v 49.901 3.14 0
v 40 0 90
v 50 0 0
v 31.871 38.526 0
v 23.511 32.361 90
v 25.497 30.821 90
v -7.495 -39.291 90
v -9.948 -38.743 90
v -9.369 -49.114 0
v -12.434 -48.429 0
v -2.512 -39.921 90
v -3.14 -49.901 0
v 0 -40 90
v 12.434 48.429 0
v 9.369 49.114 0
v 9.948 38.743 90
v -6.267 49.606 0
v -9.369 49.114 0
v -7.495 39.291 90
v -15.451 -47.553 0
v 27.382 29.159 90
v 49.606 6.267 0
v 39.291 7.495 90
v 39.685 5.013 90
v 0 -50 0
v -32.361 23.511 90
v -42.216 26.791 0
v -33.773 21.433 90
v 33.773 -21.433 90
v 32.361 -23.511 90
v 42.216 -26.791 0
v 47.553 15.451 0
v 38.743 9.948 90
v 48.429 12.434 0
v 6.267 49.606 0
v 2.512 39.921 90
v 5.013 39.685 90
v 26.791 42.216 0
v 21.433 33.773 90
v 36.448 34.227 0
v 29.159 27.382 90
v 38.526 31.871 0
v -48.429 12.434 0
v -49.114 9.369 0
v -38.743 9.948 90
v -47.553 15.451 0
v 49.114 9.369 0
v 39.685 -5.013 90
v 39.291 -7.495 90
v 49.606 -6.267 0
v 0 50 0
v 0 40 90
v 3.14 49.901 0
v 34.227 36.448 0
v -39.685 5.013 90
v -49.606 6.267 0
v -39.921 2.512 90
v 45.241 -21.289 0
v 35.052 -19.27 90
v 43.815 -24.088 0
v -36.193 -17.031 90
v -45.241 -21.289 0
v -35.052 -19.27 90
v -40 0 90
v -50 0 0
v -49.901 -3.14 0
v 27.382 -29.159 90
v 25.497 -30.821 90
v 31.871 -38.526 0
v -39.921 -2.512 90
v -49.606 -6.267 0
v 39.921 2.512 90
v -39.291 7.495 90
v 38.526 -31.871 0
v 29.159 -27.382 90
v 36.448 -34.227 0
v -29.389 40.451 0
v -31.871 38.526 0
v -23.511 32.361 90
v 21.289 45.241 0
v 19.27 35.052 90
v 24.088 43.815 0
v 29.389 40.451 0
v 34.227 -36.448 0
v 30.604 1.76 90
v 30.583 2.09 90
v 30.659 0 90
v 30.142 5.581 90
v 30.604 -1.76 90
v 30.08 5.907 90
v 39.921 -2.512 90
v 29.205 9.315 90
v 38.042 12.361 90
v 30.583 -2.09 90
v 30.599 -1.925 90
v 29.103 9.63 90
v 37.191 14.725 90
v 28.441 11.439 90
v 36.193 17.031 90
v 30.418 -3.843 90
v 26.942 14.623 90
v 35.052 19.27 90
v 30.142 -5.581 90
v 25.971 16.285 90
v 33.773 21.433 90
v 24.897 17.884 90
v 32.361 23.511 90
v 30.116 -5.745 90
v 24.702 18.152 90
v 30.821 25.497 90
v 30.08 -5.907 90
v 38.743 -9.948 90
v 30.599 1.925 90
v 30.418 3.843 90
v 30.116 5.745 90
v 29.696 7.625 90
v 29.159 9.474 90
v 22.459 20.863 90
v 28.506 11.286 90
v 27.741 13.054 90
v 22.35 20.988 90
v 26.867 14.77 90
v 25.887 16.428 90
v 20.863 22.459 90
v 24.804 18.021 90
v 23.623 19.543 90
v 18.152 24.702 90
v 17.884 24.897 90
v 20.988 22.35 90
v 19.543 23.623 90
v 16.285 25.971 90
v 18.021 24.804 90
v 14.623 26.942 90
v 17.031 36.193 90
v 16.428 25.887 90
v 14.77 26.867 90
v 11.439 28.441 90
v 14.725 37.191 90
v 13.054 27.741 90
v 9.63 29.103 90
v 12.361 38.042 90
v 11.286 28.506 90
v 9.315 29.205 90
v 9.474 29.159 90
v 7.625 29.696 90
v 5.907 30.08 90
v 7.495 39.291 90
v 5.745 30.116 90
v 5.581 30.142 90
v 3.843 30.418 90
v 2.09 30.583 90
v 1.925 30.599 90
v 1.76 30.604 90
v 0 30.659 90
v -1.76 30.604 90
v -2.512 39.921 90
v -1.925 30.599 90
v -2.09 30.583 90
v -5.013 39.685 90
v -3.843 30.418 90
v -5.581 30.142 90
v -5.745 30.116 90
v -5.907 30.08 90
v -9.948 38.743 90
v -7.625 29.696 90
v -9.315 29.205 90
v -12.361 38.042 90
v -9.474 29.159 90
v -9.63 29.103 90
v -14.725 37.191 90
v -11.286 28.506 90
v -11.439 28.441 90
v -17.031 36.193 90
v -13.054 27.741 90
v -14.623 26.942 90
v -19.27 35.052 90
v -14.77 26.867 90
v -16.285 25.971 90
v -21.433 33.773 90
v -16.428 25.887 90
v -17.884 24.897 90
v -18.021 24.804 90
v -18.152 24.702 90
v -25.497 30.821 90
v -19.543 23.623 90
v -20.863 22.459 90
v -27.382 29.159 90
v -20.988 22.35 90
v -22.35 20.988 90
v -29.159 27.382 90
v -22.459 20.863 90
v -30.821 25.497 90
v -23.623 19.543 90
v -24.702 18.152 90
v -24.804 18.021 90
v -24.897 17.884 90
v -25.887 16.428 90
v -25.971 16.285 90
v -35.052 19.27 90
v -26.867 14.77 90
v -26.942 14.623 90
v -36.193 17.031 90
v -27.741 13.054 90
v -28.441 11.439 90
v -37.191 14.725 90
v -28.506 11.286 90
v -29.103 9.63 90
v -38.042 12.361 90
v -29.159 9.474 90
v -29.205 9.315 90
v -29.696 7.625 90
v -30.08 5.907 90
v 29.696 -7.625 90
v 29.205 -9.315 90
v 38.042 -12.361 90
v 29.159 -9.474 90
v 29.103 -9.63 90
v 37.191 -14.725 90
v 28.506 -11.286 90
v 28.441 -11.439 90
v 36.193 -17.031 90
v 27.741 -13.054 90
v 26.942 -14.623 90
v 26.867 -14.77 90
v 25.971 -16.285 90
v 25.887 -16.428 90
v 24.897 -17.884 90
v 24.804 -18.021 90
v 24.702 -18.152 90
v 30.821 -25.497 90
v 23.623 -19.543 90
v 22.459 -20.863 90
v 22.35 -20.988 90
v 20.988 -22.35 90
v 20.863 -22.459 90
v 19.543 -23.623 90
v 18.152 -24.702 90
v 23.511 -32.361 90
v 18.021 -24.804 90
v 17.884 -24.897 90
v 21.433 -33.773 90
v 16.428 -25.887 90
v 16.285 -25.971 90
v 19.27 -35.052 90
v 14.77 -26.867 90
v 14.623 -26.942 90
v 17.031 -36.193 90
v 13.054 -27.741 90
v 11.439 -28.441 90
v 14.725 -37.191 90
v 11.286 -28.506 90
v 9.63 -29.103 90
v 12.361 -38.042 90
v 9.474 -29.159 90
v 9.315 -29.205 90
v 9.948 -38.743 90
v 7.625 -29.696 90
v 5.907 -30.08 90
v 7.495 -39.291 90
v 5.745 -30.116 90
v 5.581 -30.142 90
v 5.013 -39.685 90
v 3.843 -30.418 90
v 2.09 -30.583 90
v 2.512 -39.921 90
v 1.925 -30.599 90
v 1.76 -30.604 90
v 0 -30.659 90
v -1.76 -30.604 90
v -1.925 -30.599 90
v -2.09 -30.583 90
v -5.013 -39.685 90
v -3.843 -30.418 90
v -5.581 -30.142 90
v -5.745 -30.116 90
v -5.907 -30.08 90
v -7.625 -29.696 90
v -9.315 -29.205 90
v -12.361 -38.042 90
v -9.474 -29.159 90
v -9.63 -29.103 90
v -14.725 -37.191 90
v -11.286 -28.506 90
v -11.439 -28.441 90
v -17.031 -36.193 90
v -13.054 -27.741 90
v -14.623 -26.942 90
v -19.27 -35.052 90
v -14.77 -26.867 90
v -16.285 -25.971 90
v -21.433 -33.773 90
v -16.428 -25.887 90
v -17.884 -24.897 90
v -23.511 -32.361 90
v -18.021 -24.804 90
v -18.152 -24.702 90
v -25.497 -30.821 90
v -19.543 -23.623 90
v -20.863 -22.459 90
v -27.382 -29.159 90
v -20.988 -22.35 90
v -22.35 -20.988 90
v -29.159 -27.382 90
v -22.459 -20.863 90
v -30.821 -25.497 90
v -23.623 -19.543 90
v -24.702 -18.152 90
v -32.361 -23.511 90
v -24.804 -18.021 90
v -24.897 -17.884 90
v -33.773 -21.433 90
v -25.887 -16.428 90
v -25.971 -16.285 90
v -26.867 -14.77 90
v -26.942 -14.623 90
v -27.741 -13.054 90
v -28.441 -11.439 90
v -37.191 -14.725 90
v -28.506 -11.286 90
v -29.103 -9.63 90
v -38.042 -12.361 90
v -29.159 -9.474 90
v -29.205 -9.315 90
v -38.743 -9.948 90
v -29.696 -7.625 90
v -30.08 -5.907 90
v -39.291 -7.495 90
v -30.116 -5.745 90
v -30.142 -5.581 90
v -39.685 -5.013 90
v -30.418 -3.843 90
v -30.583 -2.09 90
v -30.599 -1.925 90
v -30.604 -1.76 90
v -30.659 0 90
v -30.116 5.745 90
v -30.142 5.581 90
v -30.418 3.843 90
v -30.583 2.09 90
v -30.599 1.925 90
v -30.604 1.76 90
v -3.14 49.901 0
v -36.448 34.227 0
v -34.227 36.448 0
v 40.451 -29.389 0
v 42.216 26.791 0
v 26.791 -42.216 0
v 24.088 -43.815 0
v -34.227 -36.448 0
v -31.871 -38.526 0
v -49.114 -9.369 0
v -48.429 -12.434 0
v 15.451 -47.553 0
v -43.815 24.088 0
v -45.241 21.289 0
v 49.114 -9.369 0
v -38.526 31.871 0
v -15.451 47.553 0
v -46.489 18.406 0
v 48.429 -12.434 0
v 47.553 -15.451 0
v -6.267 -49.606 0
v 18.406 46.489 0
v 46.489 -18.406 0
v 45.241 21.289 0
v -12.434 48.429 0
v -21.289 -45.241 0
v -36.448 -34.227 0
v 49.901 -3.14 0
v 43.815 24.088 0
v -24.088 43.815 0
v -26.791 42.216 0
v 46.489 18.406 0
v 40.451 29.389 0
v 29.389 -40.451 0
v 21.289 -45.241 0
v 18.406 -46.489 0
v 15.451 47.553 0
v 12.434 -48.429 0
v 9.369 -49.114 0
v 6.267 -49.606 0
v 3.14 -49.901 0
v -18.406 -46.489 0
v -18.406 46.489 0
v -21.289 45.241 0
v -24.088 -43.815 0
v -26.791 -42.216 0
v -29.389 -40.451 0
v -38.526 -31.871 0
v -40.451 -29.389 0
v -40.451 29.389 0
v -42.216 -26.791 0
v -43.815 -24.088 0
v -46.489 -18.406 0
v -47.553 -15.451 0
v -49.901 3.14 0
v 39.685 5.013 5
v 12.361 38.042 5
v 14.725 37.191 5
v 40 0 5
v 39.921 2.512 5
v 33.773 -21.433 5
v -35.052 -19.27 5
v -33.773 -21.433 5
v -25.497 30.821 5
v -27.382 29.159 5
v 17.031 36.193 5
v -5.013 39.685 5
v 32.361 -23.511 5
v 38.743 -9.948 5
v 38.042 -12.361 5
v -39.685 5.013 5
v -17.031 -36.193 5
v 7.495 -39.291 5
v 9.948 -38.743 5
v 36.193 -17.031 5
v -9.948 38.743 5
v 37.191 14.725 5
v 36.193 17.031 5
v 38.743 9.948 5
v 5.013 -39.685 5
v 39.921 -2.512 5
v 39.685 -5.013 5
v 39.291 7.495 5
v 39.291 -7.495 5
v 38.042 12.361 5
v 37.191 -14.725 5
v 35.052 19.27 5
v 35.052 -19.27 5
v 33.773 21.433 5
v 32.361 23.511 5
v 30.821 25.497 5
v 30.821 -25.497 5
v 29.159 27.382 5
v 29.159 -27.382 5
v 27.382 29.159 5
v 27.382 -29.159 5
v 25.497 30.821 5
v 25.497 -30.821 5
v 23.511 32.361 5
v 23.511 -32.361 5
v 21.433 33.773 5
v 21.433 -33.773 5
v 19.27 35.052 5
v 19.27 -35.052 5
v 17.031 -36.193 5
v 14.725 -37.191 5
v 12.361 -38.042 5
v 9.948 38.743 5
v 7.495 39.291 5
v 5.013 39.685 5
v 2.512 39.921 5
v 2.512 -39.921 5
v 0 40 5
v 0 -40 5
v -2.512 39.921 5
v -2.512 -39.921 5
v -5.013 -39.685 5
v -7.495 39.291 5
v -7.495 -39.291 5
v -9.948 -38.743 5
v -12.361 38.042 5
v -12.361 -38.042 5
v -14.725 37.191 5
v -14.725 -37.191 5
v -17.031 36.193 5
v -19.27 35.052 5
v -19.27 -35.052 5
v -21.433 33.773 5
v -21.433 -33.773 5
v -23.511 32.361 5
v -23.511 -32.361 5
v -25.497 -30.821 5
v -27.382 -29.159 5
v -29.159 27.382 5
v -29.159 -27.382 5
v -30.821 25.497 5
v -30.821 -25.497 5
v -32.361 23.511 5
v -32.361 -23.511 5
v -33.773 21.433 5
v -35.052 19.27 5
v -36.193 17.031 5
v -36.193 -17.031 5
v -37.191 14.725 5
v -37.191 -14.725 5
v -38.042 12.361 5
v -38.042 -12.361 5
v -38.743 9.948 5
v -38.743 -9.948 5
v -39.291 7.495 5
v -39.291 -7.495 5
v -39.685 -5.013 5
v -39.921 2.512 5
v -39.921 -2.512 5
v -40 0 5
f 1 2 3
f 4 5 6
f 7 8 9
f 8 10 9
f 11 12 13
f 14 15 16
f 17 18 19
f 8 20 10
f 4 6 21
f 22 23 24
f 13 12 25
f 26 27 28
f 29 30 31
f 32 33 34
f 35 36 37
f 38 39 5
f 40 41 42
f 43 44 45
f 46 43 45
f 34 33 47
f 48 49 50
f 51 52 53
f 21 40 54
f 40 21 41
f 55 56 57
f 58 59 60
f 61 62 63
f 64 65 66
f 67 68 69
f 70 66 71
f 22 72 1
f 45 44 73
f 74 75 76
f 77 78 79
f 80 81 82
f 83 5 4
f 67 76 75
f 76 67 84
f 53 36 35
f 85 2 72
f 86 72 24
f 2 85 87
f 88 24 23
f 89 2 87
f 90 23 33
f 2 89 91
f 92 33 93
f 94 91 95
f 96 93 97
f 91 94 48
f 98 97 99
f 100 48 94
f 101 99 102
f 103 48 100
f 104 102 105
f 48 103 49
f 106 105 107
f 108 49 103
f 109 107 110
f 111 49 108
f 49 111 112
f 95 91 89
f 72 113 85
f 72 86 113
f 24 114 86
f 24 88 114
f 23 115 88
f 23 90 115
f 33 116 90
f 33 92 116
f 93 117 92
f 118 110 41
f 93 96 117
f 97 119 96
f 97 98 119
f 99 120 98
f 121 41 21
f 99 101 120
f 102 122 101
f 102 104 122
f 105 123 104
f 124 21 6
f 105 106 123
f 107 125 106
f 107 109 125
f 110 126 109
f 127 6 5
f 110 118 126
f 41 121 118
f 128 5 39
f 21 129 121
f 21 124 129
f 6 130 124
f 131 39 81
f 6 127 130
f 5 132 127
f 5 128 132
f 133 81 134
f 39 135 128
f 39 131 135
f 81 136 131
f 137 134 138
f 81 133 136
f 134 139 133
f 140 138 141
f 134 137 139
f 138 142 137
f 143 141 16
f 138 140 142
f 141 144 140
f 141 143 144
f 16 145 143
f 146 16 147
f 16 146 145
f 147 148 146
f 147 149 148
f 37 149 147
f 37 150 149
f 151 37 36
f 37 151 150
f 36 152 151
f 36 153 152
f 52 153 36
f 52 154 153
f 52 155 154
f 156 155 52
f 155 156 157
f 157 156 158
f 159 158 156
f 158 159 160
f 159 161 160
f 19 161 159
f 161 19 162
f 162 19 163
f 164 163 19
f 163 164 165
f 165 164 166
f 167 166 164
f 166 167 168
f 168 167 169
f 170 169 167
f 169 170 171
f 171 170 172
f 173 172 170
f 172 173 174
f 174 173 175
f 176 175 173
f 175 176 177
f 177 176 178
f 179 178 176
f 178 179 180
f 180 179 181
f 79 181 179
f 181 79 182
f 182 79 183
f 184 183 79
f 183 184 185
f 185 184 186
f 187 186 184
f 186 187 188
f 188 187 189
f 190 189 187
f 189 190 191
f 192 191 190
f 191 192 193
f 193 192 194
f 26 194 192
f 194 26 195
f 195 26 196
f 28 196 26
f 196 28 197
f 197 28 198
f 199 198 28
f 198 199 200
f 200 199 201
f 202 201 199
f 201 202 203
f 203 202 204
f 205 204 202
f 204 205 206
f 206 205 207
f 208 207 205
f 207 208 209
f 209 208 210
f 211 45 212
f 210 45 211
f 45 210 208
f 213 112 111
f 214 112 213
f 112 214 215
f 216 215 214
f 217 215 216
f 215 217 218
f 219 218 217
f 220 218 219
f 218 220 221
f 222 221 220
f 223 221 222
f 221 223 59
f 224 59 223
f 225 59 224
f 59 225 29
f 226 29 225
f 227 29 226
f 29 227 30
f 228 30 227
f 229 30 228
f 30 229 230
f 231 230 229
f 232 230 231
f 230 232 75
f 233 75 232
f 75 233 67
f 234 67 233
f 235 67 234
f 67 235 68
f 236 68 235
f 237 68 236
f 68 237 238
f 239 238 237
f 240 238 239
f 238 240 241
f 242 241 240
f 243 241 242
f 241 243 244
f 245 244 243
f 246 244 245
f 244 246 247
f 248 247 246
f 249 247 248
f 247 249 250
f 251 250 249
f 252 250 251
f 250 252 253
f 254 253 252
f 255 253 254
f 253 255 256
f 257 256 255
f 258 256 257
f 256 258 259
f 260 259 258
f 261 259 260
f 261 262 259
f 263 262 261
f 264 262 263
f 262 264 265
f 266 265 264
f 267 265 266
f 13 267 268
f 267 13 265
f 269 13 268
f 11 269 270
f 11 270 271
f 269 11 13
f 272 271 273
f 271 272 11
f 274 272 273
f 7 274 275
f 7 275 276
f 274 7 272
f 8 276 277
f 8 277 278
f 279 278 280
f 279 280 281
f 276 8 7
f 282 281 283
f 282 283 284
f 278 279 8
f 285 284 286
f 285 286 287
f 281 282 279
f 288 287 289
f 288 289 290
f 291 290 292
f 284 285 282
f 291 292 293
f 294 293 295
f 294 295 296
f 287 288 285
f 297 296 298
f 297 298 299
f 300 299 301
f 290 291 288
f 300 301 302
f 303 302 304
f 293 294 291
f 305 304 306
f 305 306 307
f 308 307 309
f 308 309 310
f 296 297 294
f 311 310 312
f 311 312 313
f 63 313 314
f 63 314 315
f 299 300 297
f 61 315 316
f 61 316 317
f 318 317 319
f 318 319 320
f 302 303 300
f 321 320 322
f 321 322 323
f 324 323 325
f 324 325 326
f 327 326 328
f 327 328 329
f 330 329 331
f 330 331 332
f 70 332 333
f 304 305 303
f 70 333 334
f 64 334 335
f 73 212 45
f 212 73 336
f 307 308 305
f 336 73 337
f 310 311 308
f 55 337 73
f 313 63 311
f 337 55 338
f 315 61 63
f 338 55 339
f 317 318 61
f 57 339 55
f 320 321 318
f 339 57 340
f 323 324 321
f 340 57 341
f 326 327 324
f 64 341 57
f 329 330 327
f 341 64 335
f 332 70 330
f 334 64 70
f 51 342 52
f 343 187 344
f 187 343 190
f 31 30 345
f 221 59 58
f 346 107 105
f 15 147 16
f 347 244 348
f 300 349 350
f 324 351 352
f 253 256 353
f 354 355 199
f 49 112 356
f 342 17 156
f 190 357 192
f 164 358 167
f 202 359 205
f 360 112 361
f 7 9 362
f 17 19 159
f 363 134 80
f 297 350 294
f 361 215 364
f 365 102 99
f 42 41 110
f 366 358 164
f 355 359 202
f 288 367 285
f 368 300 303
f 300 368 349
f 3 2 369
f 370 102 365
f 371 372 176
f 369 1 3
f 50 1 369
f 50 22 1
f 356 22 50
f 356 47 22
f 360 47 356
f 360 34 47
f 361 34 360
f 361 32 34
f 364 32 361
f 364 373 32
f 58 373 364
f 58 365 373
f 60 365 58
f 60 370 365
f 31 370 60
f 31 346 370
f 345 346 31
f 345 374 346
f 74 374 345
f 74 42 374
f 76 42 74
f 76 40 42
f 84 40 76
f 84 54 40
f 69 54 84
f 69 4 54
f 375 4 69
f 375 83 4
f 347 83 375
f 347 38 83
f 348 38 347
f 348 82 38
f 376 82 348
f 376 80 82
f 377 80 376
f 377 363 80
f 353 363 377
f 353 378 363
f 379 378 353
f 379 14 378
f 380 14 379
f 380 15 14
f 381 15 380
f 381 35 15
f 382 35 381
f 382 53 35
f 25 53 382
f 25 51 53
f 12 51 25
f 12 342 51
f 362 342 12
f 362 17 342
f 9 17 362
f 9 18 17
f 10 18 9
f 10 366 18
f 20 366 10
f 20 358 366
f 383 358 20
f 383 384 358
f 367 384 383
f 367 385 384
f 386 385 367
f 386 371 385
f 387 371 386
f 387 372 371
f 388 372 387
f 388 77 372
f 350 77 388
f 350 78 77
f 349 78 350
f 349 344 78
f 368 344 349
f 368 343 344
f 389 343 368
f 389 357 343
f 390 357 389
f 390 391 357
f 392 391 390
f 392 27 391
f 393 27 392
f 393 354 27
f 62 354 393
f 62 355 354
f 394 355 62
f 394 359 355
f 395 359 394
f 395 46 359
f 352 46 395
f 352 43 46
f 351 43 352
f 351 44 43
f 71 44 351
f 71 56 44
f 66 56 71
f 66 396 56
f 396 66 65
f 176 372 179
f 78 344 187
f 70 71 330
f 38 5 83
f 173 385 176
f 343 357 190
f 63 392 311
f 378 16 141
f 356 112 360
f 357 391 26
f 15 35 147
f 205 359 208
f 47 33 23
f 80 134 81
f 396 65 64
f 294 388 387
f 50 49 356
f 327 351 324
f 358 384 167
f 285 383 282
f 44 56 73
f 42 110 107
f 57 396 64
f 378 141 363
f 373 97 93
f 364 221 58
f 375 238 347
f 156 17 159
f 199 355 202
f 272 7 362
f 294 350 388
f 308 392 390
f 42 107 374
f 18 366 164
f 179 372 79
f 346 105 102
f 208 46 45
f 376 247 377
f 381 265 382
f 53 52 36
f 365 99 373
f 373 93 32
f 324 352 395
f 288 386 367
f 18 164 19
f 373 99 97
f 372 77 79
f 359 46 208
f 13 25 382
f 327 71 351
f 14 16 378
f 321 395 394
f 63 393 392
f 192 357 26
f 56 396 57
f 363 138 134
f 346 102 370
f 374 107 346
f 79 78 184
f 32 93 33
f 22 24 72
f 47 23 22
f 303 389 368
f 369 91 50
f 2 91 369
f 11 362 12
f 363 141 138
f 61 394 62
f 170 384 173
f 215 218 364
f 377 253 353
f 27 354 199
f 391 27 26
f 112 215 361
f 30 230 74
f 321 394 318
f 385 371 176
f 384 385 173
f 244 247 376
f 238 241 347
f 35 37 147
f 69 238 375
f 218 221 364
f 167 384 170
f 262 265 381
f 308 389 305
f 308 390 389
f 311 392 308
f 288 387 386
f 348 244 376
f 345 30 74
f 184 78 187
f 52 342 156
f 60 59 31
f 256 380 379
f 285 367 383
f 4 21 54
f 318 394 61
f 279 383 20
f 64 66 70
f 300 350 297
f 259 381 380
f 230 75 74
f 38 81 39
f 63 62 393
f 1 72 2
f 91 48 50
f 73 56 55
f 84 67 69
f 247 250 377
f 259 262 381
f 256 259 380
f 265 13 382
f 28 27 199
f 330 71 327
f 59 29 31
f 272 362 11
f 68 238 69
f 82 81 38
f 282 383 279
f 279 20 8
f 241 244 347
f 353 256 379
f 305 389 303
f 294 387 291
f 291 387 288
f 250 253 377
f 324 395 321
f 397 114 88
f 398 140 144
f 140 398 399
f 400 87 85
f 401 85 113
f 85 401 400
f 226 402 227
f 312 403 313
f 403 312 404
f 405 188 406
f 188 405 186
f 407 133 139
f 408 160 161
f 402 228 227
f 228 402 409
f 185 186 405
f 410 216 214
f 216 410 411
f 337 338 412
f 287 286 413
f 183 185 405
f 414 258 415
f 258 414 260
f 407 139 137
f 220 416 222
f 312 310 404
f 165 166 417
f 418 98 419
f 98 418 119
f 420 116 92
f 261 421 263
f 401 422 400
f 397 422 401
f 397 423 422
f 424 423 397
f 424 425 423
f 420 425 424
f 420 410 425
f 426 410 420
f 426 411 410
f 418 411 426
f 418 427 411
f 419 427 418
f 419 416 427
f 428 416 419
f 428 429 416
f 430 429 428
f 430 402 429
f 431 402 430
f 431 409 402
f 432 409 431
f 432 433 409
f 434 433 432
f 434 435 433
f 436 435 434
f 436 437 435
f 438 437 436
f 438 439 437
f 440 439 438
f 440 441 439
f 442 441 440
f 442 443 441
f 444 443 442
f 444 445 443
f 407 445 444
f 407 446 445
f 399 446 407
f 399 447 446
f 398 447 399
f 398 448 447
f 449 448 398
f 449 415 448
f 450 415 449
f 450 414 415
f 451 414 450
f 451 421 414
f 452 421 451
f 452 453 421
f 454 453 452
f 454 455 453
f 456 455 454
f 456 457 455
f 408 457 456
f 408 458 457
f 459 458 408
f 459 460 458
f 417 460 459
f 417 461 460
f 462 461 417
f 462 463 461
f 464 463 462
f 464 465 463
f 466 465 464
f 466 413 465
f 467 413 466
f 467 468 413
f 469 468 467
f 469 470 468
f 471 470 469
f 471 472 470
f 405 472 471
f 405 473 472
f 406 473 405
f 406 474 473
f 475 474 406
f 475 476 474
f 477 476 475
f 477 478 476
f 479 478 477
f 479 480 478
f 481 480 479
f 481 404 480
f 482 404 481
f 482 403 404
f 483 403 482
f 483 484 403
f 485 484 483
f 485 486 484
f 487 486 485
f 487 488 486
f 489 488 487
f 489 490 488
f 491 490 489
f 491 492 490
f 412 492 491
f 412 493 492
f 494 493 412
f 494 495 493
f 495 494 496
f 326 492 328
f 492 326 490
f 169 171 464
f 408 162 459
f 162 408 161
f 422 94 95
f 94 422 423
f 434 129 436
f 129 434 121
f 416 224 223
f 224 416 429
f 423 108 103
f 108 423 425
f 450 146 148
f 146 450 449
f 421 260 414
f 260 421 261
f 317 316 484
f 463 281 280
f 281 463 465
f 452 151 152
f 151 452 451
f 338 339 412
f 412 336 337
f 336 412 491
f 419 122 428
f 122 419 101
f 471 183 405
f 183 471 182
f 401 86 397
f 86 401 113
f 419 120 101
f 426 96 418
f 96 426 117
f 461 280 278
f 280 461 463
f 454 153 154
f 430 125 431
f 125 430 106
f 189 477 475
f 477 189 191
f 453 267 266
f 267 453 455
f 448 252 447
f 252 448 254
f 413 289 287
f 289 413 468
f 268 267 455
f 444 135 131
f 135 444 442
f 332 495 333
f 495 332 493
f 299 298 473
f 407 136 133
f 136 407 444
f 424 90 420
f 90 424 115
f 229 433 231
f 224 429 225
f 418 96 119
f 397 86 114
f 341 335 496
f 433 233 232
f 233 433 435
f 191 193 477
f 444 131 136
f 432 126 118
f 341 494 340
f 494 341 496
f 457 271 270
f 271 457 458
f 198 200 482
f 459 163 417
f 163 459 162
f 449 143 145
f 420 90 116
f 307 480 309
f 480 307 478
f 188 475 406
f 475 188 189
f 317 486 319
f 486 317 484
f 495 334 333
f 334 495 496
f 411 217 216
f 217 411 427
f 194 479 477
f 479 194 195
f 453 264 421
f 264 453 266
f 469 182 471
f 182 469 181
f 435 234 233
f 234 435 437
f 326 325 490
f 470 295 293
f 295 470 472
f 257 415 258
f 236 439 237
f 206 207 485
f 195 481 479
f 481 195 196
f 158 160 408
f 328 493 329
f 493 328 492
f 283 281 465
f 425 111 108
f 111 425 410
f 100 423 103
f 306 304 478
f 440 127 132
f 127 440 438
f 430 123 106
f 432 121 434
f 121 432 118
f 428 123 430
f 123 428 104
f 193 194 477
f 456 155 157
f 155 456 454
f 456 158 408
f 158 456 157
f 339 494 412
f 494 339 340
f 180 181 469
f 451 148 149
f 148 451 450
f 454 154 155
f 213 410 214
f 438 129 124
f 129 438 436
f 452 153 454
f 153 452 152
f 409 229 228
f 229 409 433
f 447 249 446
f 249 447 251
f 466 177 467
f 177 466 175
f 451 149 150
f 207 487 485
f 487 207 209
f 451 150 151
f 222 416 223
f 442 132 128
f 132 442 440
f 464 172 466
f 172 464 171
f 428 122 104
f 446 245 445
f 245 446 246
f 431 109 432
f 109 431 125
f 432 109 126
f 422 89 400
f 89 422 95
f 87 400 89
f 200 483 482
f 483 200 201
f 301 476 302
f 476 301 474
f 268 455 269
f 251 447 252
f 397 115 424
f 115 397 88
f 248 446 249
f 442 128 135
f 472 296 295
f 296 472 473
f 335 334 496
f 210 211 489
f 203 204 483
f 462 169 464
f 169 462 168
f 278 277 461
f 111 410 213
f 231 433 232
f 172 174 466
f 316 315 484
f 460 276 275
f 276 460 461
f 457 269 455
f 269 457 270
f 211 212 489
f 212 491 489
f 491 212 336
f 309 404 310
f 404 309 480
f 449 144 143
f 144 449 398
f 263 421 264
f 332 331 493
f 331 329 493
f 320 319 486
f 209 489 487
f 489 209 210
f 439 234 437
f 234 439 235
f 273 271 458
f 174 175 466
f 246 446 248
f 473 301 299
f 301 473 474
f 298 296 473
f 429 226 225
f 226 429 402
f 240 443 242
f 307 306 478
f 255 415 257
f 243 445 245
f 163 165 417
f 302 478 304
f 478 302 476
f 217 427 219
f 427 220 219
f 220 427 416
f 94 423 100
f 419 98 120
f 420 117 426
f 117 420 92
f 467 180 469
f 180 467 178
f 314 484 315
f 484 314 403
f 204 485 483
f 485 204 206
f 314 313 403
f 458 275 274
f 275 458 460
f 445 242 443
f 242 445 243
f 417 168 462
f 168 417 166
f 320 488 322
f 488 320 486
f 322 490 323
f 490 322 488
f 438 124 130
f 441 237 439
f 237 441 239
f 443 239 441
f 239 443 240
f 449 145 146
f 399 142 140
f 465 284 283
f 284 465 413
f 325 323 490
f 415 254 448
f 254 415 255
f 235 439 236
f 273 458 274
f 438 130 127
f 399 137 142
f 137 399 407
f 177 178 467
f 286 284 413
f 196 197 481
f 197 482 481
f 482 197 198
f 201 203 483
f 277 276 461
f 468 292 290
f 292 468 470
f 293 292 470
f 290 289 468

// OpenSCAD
//Enter custom dimensions for your cup in mm

bottom_diameter = 50; //[1:400]
height = 90;//[1:1000]
top_diameter = 40; //[1:400]
wall_thickness = 10; //[10:100]
base_thickness = 5; //[5:100]

difference(){
cylinder($fn=100, height,bottom_diameter,top_diameter, center=true/false);
;
    translate([0,0,base_thickness]){
        cylinder($fn=100,height+1,bottom_diameter-wall_thickness,top_diameter-wall_thickness, center=true/false);}}
